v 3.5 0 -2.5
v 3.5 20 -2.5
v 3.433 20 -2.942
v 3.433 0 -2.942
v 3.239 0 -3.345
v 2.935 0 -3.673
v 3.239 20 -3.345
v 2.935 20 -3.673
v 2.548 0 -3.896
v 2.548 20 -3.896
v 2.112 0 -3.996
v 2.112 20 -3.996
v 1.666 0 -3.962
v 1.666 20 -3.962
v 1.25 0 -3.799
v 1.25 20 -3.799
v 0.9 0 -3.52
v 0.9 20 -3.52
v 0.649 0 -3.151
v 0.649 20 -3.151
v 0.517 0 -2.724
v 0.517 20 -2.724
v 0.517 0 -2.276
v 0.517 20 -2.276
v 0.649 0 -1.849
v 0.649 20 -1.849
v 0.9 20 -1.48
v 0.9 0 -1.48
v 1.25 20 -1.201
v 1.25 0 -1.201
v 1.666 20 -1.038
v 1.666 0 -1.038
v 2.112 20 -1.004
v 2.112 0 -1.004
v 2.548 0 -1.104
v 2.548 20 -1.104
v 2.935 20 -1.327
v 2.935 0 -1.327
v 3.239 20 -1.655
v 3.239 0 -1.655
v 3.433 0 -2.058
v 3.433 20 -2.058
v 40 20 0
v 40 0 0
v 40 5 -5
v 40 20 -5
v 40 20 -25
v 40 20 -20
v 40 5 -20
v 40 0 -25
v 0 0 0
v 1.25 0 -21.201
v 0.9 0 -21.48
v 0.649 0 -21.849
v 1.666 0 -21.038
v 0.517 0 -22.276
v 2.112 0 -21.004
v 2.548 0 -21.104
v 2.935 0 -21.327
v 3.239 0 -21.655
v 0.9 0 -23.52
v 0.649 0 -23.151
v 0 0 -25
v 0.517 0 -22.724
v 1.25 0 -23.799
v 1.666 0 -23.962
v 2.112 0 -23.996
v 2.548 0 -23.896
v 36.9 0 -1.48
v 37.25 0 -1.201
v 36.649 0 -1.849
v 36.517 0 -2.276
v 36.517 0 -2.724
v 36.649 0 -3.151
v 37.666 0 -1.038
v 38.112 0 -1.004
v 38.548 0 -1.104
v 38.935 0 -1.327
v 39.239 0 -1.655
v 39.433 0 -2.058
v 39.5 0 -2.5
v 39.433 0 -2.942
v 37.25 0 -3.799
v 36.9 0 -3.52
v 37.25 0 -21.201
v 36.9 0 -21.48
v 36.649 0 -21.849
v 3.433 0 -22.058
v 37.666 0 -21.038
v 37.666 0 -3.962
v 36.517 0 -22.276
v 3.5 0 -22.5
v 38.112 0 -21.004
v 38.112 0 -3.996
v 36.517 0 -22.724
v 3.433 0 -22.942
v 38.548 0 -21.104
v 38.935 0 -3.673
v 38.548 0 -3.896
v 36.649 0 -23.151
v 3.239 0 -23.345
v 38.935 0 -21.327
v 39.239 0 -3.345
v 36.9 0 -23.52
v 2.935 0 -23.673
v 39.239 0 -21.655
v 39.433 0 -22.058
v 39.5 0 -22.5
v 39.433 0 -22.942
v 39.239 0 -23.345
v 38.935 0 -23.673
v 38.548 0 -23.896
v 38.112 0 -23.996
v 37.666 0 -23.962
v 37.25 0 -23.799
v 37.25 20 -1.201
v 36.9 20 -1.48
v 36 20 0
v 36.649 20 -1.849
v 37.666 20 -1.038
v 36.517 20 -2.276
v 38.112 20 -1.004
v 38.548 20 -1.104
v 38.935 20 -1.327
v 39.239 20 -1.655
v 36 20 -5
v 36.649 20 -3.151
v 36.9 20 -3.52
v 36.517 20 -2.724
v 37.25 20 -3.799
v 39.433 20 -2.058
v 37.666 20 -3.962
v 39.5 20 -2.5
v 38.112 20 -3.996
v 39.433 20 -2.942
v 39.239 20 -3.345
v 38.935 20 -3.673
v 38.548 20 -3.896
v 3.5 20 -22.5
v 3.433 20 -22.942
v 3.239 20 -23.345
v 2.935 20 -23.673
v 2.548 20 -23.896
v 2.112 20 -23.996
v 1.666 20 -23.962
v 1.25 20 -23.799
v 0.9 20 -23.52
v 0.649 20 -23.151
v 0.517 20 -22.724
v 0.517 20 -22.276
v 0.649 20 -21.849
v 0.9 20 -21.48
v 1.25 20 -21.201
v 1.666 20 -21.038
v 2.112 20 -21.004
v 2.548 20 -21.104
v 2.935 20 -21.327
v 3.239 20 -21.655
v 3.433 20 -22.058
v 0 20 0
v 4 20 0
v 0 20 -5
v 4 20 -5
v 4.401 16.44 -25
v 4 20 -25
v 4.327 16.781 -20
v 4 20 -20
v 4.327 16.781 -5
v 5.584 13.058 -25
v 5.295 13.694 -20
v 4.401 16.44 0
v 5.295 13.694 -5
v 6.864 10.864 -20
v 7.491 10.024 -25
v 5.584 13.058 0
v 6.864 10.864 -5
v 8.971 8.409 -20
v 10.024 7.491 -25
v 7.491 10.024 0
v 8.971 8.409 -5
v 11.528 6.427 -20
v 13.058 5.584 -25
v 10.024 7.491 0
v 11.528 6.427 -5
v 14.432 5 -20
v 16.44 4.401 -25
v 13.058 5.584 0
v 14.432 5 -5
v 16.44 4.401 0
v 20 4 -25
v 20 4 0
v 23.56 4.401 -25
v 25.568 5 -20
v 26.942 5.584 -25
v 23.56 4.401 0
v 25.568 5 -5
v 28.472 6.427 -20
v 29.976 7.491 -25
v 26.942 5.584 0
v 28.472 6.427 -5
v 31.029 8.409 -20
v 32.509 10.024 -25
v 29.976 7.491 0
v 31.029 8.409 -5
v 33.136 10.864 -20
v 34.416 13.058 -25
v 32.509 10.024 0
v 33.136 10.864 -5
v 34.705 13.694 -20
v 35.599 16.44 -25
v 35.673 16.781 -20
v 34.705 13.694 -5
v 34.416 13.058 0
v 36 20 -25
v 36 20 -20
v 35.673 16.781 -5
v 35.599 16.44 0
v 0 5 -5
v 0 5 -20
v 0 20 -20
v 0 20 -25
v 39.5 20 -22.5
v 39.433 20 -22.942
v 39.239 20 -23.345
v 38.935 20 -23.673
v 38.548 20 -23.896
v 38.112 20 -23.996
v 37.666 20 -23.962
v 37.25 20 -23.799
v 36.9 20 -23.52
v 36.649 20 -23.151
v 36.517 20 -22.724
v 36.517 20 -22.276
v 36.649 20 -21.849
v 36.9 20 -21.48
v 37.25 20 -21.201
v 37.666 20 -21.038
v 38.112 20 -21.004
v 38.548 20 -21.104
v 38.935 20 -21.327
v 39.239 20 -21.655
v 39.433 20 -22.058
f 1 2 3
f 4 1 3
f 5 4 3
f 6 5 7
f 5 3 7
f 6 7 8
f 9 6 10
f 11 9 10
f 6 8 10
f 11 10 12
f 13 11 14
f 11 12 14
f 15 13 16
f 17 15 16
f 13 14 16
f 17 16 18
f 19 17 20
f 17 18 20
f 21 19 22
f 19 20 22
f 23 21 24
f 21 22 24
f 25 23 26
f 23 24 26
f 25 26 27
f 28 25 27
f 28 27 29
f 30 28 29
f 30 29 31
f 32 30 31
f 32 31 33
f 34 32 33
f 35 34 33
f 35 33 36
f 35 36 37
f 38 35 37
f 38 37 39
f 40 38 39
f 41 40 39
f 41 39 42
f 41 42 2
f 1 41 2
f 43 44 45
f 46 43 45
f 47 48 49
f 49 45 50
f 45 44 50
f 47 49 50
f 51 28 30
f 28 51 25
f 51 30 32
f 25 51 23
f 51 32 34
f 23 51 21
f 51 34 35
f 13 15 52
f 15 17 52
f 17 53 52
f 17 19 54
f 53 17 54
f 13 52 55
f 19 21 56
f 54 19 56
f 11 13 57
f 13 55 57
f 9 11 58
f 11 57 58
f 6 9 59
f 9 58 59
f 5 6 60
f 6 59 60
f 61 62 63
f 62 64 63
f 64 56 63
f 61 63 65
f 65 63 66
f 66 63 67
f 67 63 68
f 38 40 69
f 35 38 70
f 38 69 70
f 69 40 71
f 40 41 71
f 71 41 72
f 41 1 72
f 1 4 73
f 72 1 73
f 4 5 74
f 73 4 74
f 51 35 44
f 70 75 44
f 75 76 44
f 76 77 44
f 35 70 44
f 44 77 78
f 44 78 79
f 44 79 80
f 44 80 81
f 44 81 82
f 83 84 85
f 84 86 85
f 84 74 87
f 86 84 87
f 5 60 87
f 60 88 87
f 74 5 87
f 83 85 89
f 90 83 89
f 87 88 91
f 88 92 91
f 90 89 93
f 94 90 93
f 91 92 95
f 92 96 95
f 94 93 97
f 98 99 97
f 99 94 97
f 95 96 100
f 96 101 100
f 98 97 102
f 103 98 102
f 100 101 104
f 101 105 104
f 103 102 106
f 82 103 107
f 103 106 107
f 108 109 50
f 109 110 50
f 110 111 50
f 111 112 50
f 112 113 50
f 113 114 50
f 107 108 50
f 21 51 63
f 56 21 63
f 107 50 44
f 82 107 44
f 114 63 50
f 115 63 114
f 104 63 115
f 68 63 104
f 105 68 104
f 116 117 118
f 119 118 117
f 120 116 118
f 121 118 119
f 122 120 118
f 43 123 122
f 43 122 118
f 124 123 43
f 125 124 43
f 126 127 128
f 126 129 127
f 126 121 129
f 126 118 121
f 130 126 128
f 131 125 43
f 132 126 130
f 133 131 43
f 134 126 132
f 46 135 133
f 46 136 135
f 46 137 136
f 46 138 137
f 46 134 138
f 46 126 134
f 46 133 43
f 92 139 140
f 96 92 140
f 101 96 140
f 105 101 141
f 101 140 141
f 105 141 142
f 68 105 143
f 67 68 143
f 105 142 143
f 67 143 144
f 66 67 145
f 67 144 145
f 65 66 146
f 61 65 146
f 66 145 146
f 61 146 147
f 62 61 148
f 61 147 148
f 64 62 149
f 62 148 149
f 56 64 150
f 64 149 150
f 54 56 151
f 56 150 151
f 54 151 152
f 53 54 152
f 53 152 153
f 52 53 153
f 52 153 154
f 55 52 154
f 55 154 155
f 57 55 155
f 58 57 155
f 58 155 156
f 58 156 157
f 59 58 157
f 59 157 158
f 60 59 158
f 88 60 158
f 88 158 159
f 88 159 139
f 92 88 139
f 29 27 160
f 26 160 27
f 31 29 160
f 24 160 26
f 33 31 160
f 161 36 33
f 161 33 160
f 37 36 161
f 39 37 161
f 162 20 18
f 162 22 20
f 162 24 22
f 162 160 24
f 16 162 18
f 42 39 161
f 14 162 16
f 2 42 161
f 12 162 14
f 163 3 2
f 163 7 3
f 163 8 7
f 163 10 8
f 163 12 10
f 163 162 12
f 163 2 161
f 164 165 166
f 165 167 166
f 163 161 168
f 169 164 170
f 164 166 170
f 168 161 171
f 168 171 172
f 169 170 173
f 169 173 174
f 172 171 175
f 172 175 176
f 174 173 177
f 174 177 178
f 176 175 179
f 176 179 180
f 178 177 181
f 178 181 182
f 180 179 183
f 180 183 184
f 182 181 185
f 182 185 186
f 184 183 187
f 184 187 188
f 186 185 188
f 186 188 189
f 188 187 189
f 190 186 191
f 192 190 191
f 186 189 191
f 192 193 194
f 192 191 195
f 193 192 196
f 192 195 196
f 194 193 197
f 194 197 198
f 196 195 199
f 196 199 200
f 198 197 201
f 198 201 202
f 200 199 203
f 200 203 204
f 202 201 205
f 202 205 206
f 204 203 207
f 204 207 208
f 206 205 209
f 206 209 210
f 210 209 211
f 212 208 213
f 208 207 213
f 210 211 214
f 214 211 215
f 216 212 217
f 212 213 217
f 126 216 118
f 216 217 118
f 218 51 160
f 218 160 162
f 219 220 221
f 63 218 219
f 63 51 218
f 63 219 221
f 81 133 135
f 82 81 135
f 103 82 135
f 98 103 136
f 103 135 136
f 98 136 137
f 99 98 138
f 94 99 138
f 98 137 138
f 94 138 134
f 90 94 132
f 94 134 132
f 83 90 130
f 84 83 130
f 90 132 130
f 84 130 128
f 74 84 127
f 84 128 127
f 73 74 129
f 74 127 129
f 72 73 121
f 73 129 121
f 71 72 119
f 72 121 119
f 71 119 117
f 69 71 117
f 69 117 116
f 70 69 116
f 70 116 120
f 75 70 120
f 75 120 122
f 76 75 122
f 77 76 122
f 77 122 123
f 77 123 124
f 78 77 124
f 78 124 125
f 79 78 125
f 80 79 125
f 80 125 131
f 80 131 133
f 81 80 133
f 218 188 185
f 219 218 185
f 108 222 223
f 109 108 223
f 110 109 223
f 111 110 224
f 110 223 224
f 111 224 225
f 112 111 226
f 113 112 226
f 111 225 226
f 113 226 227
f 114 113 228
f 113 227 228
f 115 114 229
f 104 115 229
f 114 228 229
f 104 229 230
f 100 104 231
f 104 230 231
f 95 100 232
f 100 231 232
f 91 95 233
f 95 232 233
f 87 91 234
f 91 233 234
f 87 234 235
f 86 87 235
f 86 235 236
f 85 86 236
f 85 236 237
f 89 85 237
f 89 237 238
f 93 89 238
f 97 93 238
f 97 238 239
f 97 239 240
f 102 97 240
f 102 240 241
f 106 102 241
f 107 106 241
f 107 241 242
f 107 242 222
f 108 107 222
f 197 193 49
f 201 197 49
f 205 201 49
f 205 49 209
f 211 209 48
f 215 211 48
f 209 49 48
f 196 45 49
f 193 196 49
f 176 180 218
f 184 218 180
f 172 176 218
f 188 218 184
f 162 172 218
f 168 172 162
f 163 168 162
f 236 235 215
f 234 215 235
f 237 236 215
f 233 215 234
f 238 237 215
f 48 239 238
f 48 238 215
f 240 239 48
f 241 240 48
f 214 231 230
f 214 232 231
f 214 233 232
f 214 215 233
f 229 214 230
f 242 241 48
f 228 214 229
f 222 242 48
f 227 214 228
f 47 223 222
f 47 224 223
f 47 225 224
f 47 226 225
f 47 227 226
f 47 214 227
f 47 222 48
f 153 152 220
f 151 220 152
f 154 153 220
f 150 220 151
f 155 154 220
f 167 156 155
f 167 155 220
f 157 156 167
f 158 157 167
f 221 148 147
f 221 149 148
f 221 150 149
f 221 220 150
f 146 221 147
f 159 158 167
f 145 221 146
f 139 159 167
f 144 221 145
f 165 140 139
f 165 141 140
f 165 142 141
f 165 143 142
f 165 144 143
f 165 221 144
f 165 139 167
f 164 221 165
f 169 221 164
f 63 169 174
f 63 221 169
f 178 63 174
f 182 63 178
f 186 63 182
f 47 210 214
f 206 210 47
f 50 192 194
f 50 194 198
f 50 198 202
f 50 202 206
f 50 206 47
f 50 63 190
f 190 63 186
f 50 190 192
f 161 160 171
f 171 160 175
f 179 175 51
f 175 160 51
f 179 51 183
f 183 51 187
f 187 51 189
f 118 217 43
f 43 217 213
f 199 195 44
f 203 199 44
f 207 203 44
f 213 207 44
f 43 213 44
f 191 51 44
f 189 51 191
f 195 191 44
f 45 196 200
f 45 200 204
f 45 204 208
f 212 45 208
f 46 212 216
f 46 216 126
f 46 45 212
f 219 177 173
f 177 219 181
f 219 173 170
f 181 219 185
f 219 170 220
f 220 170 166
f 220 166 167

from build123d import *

# Parameters (mm, degrees)
CROQUIS1_W              = 40
CROQUIS1_H              = 25
SALIENTE_EXTRUIR1_DEPTH = 20
CROQUIS2_R              = 16
CORTAR_EXTRUIR1_DEPTH   = 26
CROQUIS3_R              = 1.5
CORTAR_EXTRUIR2_DEPTH   = 21
CROQUIS4_W              = 15
CROQUIS4_H              = 15
CORTAR_EXTRUIR3_DEPTH   = 41


with BuildPart() as part:
    # Croquis1 → Saliente-Extruir1 (new body)
    with BuildSketch(Plane(origin=(0, 0, 0), x_dir=(1, 0, 0), z_dir=(0, 1, 0))):
        with Locations((20, 12.5)):
            Rectangle(CROQUIS1_W, CROQUIS1_H)
    extrude(amount=SALIENTE_EXTRUIR1_DEPTH)

    # Croquis2 → Cortar-Extruir1 (cut, through all)
    with BuildSketch(Plane.XY):
        with Locations((20, 20)):
            Circle(CROQUIS2_R)
    extrude(amount=-CORTAR_EXTRUIR1_DEPTH, mode=Mode.SUBTRACT)

    # Croquis3 → Cortar-Extruir2 (cut, through all)
    with BuildSketch(Plane(origin=(0, 20, 0), x_dir=(1, 0, 0), z_dir=(0, 1, 0))):
        with Locations((2, 2.5)):
            Circle(CROQUIS3_R)
        with Locations((2, 22.5)):
            Circle(CROQUIS3_R)
        with Locations((38, 2.5)):
            Circle(CROQUIS3_R)
        with Locations((38, 22.5)):
            Circle(CROQUIS3_R)
    extrude(amount=-CORTAR_EXTRUIR2_DEPTH, mode=Mode.SUBTRACT)

    # Croquis4 → Cortar-Extruir3 (cut, through all)
    with BuildSketch(Plane(origin=(40, 0, 0), x_dir=(0, 0, -1), z_dir=(1, 0, 0))):
        with Locations((12.5, 12.5)):
            Rectangle(CROQUIS4_W, CROQUIS4_H)
    extrude(amount=-CORTAR_EXTRUIR3_DEPTH, mode=Mode.SUBTRACT)


solid = part.part
